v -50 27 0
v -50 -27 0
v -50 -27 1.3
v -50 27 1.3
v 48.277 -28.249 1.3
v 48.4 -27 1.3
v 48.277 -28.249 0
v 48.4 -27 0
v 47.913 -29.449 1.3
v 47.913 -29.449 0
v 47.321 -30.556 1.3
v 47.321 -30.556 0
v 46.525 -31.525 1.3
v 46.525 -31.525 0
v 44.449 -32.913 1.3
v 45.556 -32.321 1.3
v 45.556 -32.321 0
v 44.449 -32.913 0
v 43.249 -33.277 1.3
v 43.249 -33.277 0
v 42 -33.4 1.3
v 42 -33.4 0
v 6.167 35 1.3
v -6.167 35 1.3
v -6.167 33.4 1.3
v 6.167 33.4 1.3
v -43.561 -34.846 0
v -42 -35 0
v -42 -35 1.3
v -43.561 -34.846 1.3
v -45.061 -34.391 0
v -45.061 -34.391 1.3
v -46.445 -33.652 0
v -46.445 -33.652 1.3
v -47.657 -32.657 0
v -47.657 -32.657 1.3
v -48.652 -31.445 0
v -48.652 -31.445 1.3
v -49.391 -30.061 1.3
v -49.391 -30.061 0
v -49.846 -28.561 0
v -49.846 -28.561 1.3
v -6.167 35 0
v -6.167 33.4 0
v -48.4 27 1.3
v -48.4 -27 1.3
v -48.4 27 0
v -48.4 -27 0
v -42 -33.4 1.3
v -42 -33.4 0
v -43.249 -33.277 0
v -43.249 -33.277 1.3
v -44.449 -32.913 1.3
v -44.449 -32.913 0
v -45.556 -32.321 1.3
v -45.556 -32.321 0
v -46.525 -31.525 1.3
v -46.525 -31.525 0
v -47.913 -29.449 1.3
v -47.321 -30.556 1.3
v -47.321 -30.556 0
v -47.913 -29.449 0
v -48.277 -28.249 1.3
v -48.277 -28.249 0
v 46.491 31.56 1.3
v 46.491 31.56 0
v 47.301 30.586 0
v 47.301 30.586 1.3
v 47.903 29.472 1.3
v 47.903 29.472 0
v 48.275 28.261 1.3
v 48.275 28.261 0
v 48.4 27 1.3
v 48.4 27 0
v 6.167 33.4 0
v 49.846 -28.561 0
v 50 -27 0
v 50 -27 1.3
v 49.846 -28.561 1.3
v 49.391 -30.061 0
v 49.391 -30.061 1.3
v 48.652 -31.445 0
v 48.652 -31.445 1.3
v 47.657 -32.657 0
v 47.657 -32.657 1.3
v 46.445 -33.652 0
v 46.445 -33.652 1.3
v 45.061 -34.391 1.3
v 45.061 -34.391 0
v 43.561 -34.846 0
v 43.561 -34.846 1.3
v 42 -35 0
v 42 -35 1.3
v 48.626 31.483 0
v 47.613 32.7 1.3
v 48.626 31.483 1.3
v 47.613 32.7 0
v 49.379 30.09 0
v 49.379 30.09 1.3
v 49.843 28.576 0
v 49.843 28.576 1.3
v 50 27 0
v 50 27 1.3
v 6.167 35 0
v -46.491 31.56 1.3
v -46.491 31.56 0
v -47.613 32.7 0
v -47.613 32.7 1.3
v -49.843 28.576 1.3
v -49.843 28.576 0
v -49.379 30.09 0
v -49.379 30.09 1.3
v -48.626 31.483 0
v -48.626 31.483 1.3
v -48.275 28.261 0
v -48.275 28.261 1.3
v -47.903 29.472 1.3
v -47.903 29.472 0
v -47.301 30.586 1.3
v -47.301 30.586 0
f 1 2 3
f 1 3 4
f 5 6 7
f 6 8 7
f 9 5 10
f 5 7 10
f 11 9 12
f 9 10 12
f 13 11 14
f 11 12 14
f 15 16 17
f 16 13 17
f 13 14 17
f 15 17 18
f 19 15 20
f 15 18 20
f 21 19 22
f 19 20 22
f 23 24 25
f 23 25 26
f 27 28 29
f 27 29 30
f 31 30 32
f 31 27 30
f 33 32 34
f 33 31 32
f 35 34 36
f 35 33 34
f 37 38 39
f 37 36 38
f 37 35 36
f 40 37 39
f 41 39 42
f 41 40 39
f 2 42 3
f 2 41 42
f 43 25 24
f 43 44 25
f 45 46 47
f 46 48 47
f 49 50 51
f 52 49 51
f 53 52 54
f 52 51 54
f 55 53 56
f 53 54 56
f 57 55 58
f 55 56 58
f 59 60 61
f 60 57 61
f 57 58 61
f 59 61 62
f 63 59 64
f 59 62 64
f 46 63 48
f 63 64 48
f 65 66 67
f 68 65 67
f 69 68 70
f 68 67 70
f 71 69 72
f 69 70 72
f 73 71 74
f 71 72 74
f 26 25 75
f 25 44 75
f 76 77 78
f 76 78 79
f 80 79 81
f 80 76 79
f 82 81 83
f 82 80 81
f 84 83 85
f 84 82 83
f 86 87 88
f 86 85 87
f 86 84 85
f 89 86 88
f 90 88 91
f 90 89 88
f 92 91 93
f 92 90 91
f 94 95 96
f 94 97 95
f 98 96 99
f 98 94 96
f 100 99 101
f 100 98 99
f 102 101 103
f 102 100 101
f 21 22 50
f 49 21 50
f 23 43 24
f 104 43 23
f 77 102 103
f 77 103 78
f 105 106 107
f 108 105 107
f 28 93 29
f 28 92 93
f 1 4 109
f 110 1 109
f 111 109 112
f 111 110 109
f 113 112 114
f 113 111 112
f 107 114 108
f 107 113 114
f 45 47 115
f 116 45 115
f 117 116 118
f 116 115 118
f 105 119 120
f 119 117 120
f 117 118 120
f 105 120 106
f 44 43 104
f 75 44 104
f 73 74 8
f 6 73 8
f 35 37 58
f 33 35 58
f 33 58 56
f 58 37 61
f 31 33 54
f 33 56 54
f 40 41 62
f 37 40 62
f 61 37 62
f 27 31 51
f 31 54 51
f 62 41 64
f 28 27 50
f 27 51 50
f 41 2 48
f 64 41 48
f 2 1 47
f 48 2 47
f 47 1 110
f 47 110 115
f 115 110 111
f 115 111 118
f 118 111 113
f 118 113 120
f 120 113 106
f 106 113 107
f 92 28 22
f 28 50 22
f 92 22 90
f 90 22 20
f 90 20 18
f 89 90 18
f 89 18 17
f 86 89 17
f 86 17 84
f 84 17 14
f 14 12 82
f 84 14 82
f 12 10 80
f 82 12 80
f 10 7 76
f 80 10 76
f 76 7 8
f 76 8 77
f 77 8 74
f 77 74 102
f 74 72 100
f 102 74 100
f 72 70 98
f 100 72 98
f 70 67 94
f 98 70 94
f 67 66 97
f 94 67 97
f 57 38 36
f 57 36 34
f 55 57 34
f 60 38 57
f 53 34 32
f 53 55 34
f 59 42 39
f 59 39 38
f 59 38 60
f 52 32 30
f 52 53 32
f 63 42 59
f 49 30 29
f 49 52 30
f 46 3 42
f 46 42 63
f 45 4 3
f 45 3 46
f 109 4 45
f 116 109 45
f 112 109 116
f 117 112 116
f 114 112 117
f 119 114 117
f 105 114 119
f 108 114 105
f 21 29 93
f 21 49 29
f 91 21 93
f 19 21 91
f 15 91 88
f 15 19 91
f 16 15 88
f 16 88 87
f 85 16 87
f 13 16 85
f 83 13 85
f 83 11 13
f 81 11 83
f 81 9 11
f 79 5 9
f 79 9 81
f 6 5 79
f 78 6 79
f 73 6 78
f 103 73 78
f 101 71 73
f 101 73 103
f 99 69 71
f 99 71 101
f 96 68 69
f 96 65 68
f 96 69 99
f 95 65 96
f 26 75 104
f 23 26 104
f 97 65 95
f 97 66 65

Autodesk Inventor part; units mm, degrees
ref_plane "YZ Plane" through (0, 0, 0) normal (1, 0, 0) x (0, 1, 0)
ref_plane "XZ Plane" through (0, 0, 0) normal (0, 1, 0) x (-1, 0, 0)
ref_plane "XY Plane" through (0, 0, 0) normal (0, 0, 1) x (1, 0, 0)
sketch "Náčrt1" plane through (0, 0, 0) normal (0, 0, 1) x (1, 0, 0)
  line L0 (-42, 35) -> (42, 35)
  line L1 (50, 27) -> (50, -27)
  line L2 (42, -35) -> (-42, -35)
  line L3 (-50, -27) -> (-50, 27)
  line L4 (-50, 35) -> (0, 0) construction
  line L5 (0, 0) -> (50, 35) construction
  line L6 (50, -35) -> (0, 0) construction
  arc A0 (-42, 35) -> (-50, 27) centre (-42, 27) ccw
  arc A1 (-50, -27) -> (-42, -35) centre (-42, -27) ccw
  arc A2 (42, -35) -> (50, -27) centre (42, -27) ccw
  arc A3 (50, 27) -> (42, 35) centre (42, 27) ccw
  line L7 (42, 34.2) -> (-42, 34.2) construction
  arc A4 (-42, 34.2) -> (-49.2, 27) centre (-42, 27) ccw construction
  line L8 (-49.2, 27) -> (-49.2, -27) construction
  arc A5 (-49.2, -27) -> (-42, -34.2) centre (-42, -27) ccw construction
  line L9 (-42, -34.2) -> (42, -34.2) construction
  arc A6 (42, -34.2) -> (49.2, -27) centre (42, -27) ccw construction
  line L10 (49.2, -27) -> (49.2, 27) construction
  arc A7 (49.2, 27) -> (42, 34.2) centre (42, 27) ccw construction
  line L11 (42, -33.4) -> (-42, -33.4)
  arc A8 (-48.4, -27) -> (-42, -33.4) centre (-42, -27) ccw
  line L12 (-48.4, -27) -> (-48.4, 27)
  arc A9 (-42, 33.4) -> (-48.4, 27) centre (-42, 27) ccw
  line L13 (-42, 33.4) -> (42, 33.4)
  arc A10 (48.4, 27) -> (42, 33.4) centre (42, 27) ccw
  line L14 (48.4, 27) -> (48.4, -27)
  arc A11 (42, -33.4) -> (48.4, -27) centre (42, -27) ccw
  line L15 (-42, 36.2) -> (42, 36.2) construction
  arc A12 (51.2, 27) -> (42, 36.2) centre (42, 27) ccw construction
  line L16 (51.2, 27) -> (51.2, -27) construction
  arc A13 (42, -36.2) -> (51.2, -27) centre (42, -27) ccw construction
  line L17 (42, -36.2) -> (-42, -36.2) construction
  arc A14 (-51.2, -27) -> (-42, -36.2) centre (-42, -27) ccw construction
  line L18 (-51.2, -27) -> (-51.2, 27) construction
  arc A15 (-42, 36.2) -> (-51.2, 27) centre (-42, 27) ccw construction
  line L19 (-50, 33.5) -> (50, 33.5) construction
  line L20 (42, 27) -> (47.6134, 32.7)
  line L21 (-42, 27) -> (-47.6134, 32.7)
  line L22 (6.1667, 33.4) -> (6.1667, 36.2)
  line L23 (-6.1667, 33.4) -> (-6.1667, 35)
  point P0 (46.4907, 31.56)
  point P1 (-46.4907, 31.56)
  point P2 (6.1667, 35)
  dimension "d0" = 70
  dimension "d1" = 100
  dimension "d2" = 8
  dimension "d3" = 0.8
  dimension "d4" = 0.8
  dimension "d5" = 2
  dimension "d6" = 2.7
  dimension "d7" = 0.8
  dimension "d8" = 0.8
  dimension "d10" = 35.8333
  dimension "d13" = 35.8333
extrude "Vysunutí1" add sketch "Náčrt1" along normal blind 1.3 contours L0 L22 L13 L23 | L21 A9 L12 A8 L11 A11 L14 A10 L20 A3 L1 A2 L2 A1 L3 A0
equation "\"d4\" = d3"
equation "\"d8\" = d7"
equation "\"d13\" = d10"
properties part number "universal_box-seal"
